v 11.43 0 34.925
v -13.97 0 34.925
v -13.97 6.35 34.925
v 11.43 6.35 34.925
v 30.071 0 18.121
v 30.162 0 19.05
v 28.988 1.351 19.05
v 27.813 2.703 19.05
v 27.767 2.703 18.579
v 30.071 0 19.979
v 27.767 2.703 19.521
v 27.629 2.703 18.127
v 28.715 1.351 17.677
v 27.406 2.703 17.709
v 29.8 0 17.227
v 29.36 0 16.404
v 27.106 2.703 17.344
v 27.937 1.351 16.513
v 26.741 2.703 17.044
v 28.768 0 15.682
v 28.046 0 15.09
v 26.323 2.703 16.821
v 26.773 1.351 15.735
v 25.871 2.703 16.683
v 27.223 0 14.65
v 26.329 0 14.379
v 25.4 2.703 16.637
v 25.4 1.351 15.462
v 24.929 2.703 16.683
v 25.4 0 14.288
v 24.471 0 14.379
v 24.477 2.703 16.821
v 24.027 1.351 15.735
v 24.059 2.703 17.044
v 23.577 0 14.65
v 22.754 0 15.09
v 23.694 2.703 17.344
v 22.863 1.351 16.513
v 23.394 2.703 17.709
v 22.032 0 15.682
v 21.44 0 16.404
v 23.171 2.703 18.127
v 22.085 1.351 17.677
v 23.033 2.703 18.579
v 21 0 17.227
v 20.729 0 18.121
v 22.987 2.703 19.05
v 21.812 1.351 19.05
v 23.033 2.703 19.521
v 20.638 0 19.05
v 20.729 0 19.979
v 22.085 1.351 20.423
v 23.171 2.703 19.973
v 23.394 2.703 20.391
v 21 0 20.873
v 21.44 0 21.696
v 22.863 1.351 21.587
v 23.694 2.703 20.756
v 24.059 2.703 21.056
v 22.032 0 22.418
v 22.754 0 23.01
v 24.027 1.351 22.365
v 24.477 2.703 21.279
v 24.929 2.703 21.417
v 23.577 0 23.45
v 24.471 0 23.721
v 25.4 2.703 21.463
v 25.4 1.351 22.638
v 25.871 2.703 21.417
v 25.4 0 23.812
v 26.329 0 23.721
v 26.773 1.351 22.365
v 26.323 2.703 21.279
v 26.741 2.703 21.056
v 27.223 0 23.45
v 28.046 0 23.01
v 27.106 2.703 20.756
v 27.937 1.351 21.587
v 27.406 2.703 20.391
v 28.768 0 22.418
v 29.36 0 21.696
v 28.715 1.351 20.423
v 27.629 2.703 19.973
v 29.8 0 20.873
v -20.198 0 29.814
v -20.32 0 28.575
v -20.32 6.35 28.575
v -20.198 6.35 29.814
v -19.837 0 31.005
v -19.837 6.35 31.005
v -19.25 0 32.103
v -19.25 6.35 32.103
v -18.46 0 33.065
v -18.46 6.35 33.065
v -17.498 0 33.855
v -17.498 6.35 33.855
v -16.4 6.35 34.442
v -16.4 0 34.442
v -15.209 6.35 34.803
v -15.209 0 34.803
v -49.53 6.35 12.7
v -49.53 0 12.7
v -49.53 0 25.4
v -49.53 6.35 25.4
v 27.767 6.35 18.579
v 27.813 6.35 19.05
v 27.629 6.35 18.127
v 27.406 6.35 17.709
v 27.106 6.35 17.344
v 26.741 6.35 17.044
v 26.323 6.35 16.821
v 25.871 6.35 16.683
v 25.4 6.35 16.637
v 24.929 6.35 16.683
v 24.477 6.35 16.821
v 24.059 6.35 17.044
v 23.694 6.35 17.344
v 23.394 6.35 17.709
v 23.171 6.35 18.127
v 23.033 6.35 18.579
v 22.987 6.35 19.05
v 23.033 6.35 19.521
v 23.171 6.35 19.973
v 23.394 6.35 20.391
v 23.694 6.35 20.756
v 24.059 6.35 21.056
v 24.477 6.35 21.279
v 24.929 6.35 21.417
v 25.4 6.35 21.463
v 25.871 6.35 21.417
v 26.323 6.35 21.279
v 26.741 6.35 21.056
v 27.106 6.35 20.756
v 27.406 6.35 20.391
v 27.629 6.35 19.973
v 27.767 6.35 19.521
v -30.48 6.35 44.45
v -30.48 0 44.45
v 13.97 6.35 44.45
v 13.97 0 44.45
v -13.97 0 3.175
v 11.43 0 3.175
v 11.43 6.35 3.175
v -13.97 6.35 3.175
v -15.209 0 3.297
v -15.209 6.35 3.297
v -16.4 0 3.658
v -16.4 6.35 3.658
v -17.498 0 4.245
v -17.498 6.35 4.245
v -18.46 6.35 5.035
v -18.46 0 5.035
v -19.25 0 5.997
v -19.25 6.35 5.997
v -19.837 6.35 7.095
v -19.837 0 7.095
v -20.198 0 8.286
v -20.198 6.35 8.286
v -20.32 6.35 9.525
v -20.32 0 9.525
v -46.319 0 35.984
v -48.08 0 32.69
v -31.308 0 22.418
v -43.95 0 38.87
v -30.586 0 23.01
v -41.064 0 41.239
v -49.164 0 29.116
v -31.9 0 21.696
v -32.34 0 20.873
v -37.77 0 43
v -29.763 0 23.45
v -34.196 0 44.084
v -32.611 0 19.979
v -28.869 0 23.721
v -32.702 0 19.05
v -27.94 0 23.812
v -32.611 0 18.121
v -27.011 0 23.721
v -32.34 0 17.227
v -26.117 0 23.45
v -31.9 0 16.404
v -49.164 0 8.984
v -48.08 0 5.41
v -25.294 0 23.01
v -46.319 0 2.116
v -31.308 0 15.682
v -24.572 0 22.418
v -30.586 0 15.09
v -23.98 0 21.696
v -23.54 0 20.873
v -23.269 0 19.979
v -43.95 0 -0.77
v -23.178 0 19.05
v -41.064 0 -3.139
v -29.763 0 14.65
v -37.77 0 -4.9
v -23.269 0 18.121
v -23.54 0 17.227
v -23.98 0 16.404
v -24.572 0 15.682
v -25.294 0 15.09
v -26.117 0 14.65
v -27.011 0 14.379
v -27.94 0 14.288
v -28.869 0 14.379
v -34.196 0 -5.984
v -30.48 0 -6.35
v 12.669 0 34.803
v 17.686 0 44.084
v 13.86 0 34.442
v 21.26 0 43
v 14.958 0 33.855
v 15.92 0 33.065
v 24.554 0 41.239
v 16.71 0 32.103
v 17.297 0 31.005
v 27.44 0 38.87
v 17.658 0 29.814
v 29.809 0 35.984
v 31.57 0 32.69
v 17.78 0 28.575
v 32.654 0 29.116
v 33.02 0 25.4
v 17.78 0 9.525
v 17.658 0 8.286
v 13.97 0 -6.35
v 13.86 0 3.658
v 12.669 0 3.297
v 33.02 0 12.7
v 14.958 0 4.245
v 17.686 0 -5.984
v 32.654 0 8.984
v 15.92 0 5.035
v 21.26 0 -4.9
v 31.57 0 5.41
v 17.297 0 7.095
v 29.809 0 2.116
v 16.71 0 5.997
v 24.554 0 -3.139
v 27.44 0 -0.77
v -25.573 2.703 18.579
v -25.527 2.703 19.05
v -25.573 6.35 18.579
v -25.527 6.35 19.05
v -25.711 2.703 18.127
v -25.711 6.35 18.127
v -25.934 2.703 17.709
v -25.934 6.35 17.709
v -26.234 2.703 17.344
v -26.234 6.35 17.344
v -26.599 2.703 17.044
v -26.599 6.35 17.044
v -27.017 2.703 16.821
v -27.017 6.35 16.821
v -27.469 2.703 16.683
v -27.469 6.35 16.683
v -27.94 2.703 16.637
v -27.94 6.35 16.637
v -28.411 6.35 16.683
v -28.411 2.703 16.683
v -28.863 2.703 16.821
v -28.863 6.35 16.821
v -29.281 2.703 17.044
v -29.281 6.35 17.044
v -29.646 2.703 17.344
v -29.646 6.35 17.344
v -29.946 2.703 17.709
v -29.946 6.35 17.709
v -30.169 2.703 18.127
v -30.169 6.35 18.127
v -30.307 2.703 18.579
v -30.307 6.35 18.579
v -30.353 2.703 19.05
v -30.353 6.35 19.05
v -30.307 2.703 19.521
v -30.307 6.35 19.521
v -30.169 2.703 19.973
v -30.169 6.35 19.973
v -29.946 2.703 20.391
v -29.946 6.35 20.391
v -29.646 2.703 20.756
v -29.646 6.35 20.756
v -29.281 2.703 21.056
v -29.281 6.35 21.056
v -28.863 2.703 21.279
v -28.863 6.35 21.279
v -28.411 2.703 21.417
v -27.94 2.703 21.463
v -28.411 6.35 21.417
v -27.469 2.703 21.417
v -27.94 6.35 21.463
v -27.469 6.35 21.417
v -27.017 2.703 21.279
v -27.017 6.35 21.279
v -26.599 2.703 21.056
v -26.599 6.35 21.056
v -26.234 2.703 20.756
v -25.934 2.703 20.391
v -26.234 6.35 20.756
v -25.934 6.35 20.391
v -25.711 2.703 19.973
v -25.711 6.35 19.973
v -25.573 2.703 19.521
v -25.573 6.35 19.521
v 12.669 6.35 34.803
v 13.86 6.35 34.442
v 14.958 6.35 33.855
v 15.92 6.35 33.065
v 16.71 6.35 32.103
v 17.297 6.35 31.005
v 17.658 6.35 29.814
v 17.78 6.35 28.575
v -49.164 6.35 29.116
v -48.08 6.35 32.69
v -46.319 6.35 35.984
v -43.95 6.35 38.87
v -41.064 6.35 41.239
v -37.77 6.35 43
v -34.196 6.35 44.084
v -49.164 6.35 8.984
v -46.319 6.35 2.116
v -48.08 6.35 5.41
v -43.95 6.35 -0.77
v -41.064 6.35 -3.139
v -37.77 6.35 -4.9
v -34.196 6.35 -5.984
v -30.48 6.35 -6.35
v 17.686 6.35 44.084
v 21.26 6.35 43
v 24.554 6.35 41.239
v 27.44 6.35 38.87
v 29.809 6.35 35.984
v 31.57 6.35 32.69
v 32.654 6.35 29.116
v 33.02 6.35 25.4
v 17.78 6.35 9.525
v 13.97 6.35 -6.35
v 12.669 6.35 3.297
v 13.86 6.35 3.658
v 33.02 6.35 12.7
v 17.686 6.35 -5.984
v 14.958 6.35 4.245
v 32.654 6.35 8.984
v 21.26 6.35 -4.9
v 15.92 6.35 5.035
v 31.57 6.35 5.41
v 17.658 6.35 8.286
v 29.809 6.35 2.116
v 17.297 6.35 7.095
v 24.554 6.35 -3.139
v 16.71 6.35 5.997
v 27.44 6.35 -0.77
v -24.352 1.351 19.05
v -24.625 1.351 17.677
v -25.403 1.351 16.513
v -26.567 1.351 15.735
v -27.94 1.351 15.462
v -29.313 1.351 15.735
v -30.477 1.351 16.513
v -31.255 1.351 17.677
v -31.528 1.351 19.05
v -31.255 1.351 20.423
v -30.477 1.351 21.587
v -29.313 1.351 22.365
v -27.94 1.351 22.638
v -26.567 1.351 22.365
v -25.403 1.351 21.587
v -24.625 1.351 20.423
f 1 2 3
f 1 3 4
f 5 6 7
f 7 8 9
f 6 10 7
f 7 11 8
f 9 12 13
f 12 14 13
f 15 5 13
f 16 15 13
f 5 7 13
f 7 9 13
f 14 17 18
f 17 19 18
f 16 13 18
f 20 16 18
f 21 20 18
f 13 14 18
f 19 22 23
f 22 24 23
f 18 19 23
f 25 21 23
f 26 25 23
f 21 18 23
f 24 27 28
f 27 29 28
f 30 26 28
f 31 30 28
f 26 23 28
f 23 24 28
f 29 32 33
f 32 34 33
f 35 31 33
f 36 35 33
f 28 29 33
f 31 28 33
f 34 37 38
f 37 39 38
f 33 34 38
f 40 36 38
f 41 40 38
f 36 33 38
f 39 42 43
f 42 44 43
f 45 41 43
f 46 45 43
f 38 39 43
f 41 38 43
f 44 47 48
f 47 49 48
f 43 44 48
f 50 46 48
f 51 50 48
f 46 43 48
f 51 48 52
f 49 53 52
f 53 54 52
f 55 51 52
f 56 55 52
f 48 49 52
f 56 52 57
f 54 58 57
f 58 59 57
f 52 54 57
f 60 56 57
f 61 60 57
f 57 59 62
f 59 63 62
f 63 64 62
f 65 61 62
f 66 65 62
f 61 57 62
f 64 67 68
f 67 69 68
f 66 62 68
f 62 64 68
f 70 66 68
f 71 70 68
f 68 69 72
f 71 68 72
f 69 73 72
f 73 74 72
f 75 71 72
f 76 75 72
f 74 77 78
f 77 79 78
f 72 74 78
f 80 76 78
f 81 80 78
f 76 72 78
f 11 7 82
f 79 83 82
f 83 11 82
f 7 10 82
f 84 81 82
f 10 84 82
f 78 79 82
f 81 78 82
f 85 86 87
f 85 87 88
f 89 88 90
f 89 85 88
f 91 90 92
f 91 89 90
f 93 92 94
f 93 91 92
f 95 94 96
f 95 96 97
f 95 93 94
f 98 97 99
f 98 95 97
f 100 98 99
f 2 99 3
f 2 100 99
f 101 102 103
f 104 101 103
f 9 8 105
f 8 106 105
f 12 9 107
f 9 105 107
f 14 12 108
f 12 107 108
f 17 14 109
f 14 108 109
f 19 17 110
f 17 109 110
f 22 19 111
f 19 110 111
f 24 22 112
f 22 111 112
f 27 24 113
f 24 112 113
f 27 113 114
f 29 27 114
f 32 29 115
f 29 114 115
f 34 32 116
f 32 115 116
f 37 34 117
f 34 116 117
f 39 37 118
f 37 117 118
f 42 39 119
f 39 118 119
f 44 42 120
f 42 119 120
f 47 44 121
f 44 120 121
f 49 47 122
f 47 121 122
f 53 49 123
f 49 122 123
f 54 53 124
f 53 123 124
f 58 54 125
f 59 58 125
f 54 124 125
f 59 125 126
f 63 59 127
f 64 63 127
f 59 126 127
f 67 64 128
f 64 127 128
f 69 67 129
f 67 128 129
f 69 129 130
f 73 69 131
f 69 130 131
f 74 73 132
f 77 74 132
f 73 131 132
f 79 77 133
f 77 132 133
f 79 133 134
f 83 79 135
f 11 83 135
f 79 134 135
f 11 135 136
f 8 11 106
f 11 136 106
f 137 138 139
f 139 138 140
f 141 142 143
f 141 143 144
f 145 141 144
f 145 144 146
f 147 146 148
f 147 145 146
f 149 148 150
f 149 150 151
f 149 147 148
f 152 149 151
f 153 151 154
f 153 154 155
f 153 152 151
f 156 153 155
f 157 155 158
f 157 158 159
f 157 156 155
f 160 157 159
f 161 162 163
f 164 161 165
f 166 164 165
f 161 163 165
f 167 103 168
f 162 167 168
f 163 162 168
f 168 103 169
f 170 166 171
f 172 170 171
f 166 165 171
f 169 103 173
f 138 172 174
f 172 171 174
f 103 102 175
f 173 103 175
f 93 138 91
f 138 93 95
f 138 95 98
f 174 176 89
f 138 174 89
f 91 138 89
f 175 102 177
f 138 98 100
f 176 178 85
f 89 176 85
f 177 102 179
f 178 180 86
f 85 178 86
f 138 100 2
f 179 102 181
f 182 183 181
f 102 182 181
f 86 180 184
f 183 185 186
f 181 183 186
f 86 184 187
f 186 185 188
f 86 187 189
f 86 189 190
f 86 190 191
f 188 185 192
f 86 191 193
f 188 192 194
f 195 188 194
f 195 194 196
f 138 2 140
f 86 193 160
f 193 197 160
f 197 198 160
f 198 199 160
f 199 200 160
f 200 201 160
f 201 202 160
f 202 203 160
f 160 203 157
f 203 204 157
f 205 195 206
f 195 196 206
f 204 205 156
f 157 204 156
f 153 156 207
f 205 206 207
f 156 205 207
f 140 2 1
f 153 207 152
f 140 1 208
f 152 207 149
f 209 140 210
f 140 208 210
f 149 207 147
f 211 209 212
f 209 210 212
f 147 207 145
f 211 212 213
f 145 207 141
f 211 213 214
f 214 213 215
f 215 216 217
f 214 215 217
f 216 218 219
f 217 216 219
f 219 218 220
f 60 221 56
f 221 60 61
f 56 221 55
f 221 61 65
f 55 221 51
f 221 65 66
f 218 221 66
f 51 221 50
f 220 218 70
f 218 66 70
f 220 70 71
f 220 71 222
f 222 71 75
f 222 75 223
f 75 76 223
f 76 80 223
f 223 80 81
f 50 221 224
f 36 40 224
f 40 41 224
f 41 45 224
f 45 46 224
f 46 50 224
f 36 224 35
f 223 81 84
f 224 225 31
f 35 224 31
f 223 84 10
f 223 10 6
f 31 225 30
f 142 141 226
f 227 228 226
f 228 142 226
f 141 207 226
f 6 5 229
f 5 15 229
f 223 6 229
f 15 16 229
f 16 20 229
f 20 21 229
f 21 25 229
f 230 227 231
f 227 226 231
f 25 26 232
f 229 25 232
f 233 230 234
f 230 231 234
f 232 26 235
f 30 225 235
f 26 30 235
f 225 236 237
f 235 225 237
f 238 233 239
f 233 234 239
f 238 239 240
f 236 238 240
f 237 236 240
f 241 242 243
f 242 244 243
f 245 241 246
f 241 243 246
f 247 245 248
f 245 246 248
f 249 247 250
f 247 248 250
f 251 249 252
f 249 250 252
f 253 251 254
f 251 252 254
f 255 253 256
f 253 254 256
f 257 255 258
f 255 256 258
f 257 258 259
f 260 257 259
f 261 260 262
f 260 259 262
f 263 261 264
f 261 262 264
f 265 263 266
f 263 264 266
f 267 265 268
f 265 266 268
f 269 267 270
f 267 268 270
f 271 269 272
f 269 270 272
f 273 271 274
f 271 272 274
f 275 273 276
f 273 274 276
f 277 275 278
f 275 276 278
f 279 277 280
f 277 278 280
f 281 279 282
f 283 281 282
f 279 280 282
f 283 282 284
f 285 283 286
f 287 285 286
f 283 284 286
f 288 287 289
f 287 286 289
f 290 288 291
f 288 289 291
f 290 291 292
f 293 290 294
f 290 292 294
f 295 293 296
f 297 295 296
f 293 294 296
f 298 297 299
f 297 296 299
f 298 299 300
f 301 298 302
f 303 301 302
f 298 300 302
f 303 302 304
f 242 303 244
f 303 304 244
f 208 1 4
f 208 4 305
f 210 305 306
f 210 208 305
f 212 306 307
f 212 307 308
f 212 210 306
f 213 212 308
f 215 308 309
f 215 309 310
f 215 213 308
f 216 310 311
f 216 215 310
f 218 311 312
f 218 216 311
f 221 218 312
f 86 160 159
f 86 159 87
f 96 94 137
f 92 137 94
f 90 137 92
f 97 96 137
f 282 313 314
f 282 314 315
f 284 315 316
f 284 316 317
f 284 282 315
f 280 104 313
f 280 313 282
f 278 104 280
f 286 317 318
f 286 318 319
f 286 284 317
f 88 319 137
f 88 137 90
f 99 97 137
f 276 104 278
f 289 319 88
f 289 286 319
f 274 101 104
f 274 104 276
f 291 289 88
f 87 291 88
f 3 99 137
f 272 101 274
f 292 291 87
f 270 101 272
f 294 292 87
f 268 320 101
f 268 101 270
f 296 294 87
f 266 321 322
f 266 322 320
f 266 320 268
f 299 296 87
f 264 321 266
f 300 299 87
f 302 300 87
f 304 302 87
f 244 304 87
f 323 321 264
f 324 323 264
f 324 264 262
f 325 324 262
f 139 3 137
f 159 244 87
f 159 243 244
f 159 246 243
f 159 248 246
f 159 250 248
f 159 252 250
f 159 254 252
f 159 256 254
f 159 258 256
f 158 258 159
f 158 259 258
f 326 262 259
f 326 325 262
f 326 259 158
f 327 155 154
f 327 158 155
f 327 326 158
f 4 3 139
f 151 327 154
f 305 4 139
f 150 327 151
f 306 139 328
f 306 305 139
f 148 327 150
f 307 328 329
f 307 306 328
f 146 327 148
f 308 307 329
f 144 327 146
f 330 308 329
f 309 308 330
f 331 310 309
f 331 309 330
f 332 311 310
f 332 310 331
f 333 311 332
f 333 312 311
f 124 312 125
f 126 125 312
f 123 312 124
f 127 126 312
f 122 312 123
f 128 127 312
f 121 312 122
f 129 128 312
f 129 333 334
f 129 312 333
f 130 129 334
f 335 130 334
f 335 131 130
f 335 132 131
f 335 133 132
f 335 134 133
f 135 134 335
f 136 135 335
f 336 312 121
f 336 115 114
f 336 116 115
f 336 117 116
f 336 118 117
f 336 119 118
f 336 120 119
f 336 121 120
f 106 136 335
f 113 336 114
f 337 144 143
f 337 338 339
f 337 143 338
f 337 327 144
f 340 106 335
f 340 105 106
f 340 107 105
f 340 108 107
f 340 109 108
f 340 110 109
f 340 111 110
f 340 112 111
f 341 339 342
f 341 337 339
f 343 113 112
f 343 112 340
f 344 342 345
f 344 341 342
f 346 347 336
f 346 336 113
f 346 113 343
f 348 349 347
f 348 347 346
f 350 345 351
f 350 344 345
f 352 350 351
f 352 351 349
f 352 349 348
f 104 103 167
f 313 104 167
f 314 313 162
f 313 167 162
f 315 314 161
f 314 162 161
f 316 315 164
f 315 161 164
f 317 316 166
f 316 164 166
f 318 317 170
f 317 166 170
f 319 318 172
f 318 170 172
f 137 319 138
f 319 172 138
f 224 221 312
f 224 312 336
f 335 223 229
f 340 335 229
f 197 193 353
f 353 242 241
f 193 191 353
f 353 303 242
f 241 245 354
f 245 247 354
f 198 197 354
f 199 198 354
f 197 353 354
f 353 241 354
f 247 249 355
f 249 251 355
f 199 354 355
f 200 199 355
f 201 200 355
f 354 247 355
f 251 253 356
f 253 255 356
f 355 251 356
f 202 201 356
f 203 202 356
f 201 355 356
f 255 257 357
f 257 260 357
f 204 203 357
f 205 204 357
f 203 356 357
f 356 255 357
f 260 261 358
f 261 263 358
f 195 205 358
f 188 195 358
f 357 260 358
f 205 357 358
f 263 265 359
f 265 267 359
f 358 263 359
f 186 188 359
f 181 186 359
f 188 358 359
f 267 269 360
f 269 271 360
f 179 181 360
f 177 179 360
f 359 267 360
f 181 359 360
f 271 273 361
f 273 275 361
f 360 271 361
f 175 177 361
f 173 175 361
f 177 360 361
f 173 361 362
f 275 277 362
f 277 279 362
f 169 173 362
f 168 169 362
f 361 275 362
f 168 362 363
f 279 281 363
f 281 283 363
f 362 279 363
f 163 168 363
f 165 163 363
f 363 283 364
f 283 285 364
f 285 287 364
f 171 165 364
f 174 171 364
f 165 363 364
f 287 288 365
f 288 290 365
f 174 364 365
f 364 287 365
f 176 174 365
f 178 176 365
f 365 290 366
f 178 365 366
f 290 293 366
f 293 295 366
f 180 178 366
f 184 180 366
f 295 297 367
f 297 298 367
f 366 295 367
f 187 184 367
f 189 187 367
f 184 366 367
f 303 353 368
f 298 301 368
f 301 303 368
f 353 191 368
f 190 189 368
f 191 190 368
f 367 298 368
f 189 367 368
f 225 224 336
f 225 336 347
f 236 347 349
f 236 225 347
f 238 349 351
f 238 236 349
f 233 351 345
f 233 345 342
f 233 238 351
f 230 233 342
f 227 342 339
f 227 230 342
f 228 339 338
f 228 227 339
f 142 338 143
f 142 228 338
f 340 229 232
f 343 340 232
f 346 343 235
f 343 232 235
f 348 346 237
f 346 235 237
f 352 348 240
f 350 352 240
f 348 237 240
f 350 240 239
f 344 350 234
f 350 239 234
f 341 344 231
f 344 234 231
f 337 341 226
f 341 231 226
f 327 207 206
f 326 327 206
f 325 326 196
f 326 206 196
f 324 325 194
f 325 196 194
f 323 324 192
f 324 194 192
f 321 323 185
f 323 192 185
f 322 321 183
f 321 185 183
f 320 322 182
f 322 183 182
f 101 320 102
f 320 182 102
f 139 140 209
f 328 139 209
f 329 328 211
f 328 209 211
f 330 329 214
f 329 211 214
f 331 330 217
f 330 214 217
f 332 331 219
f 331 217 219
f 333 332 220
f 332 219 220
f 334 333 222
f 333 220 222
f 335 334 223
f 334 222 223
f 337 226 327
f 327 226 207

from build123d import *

# Parameters (mm, degrees)
BOSS_EXTRUDE1_DEPTH                             = 6.35
CSK_FOR_10_FLAT_HEAD_MACHINE_SCREW1_D           = 4.826
CSK_FOR_10_FLAT_HEAD_MACHINE_SCREW1_CSINK_D     = 9.525
CSK_FOR_10_FLAT_HEAD_MACHINE_SCREW1_CSINK_ANGLE = 82


with BuildPart() as part:
    # Sketch1 → Boss-Extrude1 (new body)
    with BuildSketch(Plane(origin=(0, 0, 0), x_dir=(1, 0, 0), z_dir=(0, 1, 0))):
        with BuildLine():
            Line((13.97, 6.35), (-30.48, 6.35))
            ThreePointArc((-30.48, 6.35), (-43.950384182, 0.770384182), (-49.53, -12.7))
            Line((-49.53, -12.7), (-49.53, -25.4))
            ThreePointArc((-49.53, -25.4), (-43.950384182, -38.870384182), (-30.48, -44.45))
            Line((-30.48, -44.45), (13.97, -44.45))
            ThreePointArc((13.97, -44.45), (27.440384182, -38.870384182), (33.02, -25.4))
            Line((33.02, -25.4), (33.02, -12.7))
            ThreePointArc((33.02, -12.7), (27.440384182, 0.770384182), (13.97, 6.35))
        make_face()
        with BuildLine():
            Line((-20.32, -12.7), (-20.32, -25.4))
            Line((-20.32, -25.4), (-20.32, -28.575))
            ThreePointArc((-20.32, -28.575), (-18.460128061, -33.065128061), (-13.97, -34.925))
            Line((-13.97, -34.925), (11.43, -34.925))
            ThreePointArc((11.43, -34.925), (15.920128061, -33.065128061), (17.78, -28.575))
            Line((17.78, -28.575), (17.78, -25.4))
            Line((17.78, -25.4), (17.78, -12.7))
            Line((17.78, -12.7), (17.78, -9.525))
            ThreePointArc((17.78, -9.525), (15.920128061, -5.034871939), (11.43, -3.175))
            Line((11.43, -3.175), (-13.97, -3.175))
            ThreePointArc((-13.97, -3.175), (-18.460128061, -5.034871939), (-20.32, -9.525))
            Line((-20.32, -9.525), (-20.32, -12.7))
        make_face(mode=Mode.SUBTRACT)
    extrude(amount=BOSS_EXTRUDE1_DEPTH)

    # CSK for #10 Flat Head Machine Screw1 (through all)
    with Locations(Plane(origin=(0, 0, 0), x_dir=(-1, 0, 0), z_dir=(0, -1, 0))):
        with Locations((27.94, -19.05), (-25.4, -19.05)):
            CounterSinkHole(CSK_FOR_10_FLAT_HEAD_MACHINE_SCREW1_D / 2, CSK_FOR_10_FLAT_HEAD_MACHINE_SCREW1_CSINK_D / 2, counter_sink_angle=CSK_FOR_10_FLAT_HEAD_MACHINE_SCREW1_CSINK_ANGLE)


solid = part.part
